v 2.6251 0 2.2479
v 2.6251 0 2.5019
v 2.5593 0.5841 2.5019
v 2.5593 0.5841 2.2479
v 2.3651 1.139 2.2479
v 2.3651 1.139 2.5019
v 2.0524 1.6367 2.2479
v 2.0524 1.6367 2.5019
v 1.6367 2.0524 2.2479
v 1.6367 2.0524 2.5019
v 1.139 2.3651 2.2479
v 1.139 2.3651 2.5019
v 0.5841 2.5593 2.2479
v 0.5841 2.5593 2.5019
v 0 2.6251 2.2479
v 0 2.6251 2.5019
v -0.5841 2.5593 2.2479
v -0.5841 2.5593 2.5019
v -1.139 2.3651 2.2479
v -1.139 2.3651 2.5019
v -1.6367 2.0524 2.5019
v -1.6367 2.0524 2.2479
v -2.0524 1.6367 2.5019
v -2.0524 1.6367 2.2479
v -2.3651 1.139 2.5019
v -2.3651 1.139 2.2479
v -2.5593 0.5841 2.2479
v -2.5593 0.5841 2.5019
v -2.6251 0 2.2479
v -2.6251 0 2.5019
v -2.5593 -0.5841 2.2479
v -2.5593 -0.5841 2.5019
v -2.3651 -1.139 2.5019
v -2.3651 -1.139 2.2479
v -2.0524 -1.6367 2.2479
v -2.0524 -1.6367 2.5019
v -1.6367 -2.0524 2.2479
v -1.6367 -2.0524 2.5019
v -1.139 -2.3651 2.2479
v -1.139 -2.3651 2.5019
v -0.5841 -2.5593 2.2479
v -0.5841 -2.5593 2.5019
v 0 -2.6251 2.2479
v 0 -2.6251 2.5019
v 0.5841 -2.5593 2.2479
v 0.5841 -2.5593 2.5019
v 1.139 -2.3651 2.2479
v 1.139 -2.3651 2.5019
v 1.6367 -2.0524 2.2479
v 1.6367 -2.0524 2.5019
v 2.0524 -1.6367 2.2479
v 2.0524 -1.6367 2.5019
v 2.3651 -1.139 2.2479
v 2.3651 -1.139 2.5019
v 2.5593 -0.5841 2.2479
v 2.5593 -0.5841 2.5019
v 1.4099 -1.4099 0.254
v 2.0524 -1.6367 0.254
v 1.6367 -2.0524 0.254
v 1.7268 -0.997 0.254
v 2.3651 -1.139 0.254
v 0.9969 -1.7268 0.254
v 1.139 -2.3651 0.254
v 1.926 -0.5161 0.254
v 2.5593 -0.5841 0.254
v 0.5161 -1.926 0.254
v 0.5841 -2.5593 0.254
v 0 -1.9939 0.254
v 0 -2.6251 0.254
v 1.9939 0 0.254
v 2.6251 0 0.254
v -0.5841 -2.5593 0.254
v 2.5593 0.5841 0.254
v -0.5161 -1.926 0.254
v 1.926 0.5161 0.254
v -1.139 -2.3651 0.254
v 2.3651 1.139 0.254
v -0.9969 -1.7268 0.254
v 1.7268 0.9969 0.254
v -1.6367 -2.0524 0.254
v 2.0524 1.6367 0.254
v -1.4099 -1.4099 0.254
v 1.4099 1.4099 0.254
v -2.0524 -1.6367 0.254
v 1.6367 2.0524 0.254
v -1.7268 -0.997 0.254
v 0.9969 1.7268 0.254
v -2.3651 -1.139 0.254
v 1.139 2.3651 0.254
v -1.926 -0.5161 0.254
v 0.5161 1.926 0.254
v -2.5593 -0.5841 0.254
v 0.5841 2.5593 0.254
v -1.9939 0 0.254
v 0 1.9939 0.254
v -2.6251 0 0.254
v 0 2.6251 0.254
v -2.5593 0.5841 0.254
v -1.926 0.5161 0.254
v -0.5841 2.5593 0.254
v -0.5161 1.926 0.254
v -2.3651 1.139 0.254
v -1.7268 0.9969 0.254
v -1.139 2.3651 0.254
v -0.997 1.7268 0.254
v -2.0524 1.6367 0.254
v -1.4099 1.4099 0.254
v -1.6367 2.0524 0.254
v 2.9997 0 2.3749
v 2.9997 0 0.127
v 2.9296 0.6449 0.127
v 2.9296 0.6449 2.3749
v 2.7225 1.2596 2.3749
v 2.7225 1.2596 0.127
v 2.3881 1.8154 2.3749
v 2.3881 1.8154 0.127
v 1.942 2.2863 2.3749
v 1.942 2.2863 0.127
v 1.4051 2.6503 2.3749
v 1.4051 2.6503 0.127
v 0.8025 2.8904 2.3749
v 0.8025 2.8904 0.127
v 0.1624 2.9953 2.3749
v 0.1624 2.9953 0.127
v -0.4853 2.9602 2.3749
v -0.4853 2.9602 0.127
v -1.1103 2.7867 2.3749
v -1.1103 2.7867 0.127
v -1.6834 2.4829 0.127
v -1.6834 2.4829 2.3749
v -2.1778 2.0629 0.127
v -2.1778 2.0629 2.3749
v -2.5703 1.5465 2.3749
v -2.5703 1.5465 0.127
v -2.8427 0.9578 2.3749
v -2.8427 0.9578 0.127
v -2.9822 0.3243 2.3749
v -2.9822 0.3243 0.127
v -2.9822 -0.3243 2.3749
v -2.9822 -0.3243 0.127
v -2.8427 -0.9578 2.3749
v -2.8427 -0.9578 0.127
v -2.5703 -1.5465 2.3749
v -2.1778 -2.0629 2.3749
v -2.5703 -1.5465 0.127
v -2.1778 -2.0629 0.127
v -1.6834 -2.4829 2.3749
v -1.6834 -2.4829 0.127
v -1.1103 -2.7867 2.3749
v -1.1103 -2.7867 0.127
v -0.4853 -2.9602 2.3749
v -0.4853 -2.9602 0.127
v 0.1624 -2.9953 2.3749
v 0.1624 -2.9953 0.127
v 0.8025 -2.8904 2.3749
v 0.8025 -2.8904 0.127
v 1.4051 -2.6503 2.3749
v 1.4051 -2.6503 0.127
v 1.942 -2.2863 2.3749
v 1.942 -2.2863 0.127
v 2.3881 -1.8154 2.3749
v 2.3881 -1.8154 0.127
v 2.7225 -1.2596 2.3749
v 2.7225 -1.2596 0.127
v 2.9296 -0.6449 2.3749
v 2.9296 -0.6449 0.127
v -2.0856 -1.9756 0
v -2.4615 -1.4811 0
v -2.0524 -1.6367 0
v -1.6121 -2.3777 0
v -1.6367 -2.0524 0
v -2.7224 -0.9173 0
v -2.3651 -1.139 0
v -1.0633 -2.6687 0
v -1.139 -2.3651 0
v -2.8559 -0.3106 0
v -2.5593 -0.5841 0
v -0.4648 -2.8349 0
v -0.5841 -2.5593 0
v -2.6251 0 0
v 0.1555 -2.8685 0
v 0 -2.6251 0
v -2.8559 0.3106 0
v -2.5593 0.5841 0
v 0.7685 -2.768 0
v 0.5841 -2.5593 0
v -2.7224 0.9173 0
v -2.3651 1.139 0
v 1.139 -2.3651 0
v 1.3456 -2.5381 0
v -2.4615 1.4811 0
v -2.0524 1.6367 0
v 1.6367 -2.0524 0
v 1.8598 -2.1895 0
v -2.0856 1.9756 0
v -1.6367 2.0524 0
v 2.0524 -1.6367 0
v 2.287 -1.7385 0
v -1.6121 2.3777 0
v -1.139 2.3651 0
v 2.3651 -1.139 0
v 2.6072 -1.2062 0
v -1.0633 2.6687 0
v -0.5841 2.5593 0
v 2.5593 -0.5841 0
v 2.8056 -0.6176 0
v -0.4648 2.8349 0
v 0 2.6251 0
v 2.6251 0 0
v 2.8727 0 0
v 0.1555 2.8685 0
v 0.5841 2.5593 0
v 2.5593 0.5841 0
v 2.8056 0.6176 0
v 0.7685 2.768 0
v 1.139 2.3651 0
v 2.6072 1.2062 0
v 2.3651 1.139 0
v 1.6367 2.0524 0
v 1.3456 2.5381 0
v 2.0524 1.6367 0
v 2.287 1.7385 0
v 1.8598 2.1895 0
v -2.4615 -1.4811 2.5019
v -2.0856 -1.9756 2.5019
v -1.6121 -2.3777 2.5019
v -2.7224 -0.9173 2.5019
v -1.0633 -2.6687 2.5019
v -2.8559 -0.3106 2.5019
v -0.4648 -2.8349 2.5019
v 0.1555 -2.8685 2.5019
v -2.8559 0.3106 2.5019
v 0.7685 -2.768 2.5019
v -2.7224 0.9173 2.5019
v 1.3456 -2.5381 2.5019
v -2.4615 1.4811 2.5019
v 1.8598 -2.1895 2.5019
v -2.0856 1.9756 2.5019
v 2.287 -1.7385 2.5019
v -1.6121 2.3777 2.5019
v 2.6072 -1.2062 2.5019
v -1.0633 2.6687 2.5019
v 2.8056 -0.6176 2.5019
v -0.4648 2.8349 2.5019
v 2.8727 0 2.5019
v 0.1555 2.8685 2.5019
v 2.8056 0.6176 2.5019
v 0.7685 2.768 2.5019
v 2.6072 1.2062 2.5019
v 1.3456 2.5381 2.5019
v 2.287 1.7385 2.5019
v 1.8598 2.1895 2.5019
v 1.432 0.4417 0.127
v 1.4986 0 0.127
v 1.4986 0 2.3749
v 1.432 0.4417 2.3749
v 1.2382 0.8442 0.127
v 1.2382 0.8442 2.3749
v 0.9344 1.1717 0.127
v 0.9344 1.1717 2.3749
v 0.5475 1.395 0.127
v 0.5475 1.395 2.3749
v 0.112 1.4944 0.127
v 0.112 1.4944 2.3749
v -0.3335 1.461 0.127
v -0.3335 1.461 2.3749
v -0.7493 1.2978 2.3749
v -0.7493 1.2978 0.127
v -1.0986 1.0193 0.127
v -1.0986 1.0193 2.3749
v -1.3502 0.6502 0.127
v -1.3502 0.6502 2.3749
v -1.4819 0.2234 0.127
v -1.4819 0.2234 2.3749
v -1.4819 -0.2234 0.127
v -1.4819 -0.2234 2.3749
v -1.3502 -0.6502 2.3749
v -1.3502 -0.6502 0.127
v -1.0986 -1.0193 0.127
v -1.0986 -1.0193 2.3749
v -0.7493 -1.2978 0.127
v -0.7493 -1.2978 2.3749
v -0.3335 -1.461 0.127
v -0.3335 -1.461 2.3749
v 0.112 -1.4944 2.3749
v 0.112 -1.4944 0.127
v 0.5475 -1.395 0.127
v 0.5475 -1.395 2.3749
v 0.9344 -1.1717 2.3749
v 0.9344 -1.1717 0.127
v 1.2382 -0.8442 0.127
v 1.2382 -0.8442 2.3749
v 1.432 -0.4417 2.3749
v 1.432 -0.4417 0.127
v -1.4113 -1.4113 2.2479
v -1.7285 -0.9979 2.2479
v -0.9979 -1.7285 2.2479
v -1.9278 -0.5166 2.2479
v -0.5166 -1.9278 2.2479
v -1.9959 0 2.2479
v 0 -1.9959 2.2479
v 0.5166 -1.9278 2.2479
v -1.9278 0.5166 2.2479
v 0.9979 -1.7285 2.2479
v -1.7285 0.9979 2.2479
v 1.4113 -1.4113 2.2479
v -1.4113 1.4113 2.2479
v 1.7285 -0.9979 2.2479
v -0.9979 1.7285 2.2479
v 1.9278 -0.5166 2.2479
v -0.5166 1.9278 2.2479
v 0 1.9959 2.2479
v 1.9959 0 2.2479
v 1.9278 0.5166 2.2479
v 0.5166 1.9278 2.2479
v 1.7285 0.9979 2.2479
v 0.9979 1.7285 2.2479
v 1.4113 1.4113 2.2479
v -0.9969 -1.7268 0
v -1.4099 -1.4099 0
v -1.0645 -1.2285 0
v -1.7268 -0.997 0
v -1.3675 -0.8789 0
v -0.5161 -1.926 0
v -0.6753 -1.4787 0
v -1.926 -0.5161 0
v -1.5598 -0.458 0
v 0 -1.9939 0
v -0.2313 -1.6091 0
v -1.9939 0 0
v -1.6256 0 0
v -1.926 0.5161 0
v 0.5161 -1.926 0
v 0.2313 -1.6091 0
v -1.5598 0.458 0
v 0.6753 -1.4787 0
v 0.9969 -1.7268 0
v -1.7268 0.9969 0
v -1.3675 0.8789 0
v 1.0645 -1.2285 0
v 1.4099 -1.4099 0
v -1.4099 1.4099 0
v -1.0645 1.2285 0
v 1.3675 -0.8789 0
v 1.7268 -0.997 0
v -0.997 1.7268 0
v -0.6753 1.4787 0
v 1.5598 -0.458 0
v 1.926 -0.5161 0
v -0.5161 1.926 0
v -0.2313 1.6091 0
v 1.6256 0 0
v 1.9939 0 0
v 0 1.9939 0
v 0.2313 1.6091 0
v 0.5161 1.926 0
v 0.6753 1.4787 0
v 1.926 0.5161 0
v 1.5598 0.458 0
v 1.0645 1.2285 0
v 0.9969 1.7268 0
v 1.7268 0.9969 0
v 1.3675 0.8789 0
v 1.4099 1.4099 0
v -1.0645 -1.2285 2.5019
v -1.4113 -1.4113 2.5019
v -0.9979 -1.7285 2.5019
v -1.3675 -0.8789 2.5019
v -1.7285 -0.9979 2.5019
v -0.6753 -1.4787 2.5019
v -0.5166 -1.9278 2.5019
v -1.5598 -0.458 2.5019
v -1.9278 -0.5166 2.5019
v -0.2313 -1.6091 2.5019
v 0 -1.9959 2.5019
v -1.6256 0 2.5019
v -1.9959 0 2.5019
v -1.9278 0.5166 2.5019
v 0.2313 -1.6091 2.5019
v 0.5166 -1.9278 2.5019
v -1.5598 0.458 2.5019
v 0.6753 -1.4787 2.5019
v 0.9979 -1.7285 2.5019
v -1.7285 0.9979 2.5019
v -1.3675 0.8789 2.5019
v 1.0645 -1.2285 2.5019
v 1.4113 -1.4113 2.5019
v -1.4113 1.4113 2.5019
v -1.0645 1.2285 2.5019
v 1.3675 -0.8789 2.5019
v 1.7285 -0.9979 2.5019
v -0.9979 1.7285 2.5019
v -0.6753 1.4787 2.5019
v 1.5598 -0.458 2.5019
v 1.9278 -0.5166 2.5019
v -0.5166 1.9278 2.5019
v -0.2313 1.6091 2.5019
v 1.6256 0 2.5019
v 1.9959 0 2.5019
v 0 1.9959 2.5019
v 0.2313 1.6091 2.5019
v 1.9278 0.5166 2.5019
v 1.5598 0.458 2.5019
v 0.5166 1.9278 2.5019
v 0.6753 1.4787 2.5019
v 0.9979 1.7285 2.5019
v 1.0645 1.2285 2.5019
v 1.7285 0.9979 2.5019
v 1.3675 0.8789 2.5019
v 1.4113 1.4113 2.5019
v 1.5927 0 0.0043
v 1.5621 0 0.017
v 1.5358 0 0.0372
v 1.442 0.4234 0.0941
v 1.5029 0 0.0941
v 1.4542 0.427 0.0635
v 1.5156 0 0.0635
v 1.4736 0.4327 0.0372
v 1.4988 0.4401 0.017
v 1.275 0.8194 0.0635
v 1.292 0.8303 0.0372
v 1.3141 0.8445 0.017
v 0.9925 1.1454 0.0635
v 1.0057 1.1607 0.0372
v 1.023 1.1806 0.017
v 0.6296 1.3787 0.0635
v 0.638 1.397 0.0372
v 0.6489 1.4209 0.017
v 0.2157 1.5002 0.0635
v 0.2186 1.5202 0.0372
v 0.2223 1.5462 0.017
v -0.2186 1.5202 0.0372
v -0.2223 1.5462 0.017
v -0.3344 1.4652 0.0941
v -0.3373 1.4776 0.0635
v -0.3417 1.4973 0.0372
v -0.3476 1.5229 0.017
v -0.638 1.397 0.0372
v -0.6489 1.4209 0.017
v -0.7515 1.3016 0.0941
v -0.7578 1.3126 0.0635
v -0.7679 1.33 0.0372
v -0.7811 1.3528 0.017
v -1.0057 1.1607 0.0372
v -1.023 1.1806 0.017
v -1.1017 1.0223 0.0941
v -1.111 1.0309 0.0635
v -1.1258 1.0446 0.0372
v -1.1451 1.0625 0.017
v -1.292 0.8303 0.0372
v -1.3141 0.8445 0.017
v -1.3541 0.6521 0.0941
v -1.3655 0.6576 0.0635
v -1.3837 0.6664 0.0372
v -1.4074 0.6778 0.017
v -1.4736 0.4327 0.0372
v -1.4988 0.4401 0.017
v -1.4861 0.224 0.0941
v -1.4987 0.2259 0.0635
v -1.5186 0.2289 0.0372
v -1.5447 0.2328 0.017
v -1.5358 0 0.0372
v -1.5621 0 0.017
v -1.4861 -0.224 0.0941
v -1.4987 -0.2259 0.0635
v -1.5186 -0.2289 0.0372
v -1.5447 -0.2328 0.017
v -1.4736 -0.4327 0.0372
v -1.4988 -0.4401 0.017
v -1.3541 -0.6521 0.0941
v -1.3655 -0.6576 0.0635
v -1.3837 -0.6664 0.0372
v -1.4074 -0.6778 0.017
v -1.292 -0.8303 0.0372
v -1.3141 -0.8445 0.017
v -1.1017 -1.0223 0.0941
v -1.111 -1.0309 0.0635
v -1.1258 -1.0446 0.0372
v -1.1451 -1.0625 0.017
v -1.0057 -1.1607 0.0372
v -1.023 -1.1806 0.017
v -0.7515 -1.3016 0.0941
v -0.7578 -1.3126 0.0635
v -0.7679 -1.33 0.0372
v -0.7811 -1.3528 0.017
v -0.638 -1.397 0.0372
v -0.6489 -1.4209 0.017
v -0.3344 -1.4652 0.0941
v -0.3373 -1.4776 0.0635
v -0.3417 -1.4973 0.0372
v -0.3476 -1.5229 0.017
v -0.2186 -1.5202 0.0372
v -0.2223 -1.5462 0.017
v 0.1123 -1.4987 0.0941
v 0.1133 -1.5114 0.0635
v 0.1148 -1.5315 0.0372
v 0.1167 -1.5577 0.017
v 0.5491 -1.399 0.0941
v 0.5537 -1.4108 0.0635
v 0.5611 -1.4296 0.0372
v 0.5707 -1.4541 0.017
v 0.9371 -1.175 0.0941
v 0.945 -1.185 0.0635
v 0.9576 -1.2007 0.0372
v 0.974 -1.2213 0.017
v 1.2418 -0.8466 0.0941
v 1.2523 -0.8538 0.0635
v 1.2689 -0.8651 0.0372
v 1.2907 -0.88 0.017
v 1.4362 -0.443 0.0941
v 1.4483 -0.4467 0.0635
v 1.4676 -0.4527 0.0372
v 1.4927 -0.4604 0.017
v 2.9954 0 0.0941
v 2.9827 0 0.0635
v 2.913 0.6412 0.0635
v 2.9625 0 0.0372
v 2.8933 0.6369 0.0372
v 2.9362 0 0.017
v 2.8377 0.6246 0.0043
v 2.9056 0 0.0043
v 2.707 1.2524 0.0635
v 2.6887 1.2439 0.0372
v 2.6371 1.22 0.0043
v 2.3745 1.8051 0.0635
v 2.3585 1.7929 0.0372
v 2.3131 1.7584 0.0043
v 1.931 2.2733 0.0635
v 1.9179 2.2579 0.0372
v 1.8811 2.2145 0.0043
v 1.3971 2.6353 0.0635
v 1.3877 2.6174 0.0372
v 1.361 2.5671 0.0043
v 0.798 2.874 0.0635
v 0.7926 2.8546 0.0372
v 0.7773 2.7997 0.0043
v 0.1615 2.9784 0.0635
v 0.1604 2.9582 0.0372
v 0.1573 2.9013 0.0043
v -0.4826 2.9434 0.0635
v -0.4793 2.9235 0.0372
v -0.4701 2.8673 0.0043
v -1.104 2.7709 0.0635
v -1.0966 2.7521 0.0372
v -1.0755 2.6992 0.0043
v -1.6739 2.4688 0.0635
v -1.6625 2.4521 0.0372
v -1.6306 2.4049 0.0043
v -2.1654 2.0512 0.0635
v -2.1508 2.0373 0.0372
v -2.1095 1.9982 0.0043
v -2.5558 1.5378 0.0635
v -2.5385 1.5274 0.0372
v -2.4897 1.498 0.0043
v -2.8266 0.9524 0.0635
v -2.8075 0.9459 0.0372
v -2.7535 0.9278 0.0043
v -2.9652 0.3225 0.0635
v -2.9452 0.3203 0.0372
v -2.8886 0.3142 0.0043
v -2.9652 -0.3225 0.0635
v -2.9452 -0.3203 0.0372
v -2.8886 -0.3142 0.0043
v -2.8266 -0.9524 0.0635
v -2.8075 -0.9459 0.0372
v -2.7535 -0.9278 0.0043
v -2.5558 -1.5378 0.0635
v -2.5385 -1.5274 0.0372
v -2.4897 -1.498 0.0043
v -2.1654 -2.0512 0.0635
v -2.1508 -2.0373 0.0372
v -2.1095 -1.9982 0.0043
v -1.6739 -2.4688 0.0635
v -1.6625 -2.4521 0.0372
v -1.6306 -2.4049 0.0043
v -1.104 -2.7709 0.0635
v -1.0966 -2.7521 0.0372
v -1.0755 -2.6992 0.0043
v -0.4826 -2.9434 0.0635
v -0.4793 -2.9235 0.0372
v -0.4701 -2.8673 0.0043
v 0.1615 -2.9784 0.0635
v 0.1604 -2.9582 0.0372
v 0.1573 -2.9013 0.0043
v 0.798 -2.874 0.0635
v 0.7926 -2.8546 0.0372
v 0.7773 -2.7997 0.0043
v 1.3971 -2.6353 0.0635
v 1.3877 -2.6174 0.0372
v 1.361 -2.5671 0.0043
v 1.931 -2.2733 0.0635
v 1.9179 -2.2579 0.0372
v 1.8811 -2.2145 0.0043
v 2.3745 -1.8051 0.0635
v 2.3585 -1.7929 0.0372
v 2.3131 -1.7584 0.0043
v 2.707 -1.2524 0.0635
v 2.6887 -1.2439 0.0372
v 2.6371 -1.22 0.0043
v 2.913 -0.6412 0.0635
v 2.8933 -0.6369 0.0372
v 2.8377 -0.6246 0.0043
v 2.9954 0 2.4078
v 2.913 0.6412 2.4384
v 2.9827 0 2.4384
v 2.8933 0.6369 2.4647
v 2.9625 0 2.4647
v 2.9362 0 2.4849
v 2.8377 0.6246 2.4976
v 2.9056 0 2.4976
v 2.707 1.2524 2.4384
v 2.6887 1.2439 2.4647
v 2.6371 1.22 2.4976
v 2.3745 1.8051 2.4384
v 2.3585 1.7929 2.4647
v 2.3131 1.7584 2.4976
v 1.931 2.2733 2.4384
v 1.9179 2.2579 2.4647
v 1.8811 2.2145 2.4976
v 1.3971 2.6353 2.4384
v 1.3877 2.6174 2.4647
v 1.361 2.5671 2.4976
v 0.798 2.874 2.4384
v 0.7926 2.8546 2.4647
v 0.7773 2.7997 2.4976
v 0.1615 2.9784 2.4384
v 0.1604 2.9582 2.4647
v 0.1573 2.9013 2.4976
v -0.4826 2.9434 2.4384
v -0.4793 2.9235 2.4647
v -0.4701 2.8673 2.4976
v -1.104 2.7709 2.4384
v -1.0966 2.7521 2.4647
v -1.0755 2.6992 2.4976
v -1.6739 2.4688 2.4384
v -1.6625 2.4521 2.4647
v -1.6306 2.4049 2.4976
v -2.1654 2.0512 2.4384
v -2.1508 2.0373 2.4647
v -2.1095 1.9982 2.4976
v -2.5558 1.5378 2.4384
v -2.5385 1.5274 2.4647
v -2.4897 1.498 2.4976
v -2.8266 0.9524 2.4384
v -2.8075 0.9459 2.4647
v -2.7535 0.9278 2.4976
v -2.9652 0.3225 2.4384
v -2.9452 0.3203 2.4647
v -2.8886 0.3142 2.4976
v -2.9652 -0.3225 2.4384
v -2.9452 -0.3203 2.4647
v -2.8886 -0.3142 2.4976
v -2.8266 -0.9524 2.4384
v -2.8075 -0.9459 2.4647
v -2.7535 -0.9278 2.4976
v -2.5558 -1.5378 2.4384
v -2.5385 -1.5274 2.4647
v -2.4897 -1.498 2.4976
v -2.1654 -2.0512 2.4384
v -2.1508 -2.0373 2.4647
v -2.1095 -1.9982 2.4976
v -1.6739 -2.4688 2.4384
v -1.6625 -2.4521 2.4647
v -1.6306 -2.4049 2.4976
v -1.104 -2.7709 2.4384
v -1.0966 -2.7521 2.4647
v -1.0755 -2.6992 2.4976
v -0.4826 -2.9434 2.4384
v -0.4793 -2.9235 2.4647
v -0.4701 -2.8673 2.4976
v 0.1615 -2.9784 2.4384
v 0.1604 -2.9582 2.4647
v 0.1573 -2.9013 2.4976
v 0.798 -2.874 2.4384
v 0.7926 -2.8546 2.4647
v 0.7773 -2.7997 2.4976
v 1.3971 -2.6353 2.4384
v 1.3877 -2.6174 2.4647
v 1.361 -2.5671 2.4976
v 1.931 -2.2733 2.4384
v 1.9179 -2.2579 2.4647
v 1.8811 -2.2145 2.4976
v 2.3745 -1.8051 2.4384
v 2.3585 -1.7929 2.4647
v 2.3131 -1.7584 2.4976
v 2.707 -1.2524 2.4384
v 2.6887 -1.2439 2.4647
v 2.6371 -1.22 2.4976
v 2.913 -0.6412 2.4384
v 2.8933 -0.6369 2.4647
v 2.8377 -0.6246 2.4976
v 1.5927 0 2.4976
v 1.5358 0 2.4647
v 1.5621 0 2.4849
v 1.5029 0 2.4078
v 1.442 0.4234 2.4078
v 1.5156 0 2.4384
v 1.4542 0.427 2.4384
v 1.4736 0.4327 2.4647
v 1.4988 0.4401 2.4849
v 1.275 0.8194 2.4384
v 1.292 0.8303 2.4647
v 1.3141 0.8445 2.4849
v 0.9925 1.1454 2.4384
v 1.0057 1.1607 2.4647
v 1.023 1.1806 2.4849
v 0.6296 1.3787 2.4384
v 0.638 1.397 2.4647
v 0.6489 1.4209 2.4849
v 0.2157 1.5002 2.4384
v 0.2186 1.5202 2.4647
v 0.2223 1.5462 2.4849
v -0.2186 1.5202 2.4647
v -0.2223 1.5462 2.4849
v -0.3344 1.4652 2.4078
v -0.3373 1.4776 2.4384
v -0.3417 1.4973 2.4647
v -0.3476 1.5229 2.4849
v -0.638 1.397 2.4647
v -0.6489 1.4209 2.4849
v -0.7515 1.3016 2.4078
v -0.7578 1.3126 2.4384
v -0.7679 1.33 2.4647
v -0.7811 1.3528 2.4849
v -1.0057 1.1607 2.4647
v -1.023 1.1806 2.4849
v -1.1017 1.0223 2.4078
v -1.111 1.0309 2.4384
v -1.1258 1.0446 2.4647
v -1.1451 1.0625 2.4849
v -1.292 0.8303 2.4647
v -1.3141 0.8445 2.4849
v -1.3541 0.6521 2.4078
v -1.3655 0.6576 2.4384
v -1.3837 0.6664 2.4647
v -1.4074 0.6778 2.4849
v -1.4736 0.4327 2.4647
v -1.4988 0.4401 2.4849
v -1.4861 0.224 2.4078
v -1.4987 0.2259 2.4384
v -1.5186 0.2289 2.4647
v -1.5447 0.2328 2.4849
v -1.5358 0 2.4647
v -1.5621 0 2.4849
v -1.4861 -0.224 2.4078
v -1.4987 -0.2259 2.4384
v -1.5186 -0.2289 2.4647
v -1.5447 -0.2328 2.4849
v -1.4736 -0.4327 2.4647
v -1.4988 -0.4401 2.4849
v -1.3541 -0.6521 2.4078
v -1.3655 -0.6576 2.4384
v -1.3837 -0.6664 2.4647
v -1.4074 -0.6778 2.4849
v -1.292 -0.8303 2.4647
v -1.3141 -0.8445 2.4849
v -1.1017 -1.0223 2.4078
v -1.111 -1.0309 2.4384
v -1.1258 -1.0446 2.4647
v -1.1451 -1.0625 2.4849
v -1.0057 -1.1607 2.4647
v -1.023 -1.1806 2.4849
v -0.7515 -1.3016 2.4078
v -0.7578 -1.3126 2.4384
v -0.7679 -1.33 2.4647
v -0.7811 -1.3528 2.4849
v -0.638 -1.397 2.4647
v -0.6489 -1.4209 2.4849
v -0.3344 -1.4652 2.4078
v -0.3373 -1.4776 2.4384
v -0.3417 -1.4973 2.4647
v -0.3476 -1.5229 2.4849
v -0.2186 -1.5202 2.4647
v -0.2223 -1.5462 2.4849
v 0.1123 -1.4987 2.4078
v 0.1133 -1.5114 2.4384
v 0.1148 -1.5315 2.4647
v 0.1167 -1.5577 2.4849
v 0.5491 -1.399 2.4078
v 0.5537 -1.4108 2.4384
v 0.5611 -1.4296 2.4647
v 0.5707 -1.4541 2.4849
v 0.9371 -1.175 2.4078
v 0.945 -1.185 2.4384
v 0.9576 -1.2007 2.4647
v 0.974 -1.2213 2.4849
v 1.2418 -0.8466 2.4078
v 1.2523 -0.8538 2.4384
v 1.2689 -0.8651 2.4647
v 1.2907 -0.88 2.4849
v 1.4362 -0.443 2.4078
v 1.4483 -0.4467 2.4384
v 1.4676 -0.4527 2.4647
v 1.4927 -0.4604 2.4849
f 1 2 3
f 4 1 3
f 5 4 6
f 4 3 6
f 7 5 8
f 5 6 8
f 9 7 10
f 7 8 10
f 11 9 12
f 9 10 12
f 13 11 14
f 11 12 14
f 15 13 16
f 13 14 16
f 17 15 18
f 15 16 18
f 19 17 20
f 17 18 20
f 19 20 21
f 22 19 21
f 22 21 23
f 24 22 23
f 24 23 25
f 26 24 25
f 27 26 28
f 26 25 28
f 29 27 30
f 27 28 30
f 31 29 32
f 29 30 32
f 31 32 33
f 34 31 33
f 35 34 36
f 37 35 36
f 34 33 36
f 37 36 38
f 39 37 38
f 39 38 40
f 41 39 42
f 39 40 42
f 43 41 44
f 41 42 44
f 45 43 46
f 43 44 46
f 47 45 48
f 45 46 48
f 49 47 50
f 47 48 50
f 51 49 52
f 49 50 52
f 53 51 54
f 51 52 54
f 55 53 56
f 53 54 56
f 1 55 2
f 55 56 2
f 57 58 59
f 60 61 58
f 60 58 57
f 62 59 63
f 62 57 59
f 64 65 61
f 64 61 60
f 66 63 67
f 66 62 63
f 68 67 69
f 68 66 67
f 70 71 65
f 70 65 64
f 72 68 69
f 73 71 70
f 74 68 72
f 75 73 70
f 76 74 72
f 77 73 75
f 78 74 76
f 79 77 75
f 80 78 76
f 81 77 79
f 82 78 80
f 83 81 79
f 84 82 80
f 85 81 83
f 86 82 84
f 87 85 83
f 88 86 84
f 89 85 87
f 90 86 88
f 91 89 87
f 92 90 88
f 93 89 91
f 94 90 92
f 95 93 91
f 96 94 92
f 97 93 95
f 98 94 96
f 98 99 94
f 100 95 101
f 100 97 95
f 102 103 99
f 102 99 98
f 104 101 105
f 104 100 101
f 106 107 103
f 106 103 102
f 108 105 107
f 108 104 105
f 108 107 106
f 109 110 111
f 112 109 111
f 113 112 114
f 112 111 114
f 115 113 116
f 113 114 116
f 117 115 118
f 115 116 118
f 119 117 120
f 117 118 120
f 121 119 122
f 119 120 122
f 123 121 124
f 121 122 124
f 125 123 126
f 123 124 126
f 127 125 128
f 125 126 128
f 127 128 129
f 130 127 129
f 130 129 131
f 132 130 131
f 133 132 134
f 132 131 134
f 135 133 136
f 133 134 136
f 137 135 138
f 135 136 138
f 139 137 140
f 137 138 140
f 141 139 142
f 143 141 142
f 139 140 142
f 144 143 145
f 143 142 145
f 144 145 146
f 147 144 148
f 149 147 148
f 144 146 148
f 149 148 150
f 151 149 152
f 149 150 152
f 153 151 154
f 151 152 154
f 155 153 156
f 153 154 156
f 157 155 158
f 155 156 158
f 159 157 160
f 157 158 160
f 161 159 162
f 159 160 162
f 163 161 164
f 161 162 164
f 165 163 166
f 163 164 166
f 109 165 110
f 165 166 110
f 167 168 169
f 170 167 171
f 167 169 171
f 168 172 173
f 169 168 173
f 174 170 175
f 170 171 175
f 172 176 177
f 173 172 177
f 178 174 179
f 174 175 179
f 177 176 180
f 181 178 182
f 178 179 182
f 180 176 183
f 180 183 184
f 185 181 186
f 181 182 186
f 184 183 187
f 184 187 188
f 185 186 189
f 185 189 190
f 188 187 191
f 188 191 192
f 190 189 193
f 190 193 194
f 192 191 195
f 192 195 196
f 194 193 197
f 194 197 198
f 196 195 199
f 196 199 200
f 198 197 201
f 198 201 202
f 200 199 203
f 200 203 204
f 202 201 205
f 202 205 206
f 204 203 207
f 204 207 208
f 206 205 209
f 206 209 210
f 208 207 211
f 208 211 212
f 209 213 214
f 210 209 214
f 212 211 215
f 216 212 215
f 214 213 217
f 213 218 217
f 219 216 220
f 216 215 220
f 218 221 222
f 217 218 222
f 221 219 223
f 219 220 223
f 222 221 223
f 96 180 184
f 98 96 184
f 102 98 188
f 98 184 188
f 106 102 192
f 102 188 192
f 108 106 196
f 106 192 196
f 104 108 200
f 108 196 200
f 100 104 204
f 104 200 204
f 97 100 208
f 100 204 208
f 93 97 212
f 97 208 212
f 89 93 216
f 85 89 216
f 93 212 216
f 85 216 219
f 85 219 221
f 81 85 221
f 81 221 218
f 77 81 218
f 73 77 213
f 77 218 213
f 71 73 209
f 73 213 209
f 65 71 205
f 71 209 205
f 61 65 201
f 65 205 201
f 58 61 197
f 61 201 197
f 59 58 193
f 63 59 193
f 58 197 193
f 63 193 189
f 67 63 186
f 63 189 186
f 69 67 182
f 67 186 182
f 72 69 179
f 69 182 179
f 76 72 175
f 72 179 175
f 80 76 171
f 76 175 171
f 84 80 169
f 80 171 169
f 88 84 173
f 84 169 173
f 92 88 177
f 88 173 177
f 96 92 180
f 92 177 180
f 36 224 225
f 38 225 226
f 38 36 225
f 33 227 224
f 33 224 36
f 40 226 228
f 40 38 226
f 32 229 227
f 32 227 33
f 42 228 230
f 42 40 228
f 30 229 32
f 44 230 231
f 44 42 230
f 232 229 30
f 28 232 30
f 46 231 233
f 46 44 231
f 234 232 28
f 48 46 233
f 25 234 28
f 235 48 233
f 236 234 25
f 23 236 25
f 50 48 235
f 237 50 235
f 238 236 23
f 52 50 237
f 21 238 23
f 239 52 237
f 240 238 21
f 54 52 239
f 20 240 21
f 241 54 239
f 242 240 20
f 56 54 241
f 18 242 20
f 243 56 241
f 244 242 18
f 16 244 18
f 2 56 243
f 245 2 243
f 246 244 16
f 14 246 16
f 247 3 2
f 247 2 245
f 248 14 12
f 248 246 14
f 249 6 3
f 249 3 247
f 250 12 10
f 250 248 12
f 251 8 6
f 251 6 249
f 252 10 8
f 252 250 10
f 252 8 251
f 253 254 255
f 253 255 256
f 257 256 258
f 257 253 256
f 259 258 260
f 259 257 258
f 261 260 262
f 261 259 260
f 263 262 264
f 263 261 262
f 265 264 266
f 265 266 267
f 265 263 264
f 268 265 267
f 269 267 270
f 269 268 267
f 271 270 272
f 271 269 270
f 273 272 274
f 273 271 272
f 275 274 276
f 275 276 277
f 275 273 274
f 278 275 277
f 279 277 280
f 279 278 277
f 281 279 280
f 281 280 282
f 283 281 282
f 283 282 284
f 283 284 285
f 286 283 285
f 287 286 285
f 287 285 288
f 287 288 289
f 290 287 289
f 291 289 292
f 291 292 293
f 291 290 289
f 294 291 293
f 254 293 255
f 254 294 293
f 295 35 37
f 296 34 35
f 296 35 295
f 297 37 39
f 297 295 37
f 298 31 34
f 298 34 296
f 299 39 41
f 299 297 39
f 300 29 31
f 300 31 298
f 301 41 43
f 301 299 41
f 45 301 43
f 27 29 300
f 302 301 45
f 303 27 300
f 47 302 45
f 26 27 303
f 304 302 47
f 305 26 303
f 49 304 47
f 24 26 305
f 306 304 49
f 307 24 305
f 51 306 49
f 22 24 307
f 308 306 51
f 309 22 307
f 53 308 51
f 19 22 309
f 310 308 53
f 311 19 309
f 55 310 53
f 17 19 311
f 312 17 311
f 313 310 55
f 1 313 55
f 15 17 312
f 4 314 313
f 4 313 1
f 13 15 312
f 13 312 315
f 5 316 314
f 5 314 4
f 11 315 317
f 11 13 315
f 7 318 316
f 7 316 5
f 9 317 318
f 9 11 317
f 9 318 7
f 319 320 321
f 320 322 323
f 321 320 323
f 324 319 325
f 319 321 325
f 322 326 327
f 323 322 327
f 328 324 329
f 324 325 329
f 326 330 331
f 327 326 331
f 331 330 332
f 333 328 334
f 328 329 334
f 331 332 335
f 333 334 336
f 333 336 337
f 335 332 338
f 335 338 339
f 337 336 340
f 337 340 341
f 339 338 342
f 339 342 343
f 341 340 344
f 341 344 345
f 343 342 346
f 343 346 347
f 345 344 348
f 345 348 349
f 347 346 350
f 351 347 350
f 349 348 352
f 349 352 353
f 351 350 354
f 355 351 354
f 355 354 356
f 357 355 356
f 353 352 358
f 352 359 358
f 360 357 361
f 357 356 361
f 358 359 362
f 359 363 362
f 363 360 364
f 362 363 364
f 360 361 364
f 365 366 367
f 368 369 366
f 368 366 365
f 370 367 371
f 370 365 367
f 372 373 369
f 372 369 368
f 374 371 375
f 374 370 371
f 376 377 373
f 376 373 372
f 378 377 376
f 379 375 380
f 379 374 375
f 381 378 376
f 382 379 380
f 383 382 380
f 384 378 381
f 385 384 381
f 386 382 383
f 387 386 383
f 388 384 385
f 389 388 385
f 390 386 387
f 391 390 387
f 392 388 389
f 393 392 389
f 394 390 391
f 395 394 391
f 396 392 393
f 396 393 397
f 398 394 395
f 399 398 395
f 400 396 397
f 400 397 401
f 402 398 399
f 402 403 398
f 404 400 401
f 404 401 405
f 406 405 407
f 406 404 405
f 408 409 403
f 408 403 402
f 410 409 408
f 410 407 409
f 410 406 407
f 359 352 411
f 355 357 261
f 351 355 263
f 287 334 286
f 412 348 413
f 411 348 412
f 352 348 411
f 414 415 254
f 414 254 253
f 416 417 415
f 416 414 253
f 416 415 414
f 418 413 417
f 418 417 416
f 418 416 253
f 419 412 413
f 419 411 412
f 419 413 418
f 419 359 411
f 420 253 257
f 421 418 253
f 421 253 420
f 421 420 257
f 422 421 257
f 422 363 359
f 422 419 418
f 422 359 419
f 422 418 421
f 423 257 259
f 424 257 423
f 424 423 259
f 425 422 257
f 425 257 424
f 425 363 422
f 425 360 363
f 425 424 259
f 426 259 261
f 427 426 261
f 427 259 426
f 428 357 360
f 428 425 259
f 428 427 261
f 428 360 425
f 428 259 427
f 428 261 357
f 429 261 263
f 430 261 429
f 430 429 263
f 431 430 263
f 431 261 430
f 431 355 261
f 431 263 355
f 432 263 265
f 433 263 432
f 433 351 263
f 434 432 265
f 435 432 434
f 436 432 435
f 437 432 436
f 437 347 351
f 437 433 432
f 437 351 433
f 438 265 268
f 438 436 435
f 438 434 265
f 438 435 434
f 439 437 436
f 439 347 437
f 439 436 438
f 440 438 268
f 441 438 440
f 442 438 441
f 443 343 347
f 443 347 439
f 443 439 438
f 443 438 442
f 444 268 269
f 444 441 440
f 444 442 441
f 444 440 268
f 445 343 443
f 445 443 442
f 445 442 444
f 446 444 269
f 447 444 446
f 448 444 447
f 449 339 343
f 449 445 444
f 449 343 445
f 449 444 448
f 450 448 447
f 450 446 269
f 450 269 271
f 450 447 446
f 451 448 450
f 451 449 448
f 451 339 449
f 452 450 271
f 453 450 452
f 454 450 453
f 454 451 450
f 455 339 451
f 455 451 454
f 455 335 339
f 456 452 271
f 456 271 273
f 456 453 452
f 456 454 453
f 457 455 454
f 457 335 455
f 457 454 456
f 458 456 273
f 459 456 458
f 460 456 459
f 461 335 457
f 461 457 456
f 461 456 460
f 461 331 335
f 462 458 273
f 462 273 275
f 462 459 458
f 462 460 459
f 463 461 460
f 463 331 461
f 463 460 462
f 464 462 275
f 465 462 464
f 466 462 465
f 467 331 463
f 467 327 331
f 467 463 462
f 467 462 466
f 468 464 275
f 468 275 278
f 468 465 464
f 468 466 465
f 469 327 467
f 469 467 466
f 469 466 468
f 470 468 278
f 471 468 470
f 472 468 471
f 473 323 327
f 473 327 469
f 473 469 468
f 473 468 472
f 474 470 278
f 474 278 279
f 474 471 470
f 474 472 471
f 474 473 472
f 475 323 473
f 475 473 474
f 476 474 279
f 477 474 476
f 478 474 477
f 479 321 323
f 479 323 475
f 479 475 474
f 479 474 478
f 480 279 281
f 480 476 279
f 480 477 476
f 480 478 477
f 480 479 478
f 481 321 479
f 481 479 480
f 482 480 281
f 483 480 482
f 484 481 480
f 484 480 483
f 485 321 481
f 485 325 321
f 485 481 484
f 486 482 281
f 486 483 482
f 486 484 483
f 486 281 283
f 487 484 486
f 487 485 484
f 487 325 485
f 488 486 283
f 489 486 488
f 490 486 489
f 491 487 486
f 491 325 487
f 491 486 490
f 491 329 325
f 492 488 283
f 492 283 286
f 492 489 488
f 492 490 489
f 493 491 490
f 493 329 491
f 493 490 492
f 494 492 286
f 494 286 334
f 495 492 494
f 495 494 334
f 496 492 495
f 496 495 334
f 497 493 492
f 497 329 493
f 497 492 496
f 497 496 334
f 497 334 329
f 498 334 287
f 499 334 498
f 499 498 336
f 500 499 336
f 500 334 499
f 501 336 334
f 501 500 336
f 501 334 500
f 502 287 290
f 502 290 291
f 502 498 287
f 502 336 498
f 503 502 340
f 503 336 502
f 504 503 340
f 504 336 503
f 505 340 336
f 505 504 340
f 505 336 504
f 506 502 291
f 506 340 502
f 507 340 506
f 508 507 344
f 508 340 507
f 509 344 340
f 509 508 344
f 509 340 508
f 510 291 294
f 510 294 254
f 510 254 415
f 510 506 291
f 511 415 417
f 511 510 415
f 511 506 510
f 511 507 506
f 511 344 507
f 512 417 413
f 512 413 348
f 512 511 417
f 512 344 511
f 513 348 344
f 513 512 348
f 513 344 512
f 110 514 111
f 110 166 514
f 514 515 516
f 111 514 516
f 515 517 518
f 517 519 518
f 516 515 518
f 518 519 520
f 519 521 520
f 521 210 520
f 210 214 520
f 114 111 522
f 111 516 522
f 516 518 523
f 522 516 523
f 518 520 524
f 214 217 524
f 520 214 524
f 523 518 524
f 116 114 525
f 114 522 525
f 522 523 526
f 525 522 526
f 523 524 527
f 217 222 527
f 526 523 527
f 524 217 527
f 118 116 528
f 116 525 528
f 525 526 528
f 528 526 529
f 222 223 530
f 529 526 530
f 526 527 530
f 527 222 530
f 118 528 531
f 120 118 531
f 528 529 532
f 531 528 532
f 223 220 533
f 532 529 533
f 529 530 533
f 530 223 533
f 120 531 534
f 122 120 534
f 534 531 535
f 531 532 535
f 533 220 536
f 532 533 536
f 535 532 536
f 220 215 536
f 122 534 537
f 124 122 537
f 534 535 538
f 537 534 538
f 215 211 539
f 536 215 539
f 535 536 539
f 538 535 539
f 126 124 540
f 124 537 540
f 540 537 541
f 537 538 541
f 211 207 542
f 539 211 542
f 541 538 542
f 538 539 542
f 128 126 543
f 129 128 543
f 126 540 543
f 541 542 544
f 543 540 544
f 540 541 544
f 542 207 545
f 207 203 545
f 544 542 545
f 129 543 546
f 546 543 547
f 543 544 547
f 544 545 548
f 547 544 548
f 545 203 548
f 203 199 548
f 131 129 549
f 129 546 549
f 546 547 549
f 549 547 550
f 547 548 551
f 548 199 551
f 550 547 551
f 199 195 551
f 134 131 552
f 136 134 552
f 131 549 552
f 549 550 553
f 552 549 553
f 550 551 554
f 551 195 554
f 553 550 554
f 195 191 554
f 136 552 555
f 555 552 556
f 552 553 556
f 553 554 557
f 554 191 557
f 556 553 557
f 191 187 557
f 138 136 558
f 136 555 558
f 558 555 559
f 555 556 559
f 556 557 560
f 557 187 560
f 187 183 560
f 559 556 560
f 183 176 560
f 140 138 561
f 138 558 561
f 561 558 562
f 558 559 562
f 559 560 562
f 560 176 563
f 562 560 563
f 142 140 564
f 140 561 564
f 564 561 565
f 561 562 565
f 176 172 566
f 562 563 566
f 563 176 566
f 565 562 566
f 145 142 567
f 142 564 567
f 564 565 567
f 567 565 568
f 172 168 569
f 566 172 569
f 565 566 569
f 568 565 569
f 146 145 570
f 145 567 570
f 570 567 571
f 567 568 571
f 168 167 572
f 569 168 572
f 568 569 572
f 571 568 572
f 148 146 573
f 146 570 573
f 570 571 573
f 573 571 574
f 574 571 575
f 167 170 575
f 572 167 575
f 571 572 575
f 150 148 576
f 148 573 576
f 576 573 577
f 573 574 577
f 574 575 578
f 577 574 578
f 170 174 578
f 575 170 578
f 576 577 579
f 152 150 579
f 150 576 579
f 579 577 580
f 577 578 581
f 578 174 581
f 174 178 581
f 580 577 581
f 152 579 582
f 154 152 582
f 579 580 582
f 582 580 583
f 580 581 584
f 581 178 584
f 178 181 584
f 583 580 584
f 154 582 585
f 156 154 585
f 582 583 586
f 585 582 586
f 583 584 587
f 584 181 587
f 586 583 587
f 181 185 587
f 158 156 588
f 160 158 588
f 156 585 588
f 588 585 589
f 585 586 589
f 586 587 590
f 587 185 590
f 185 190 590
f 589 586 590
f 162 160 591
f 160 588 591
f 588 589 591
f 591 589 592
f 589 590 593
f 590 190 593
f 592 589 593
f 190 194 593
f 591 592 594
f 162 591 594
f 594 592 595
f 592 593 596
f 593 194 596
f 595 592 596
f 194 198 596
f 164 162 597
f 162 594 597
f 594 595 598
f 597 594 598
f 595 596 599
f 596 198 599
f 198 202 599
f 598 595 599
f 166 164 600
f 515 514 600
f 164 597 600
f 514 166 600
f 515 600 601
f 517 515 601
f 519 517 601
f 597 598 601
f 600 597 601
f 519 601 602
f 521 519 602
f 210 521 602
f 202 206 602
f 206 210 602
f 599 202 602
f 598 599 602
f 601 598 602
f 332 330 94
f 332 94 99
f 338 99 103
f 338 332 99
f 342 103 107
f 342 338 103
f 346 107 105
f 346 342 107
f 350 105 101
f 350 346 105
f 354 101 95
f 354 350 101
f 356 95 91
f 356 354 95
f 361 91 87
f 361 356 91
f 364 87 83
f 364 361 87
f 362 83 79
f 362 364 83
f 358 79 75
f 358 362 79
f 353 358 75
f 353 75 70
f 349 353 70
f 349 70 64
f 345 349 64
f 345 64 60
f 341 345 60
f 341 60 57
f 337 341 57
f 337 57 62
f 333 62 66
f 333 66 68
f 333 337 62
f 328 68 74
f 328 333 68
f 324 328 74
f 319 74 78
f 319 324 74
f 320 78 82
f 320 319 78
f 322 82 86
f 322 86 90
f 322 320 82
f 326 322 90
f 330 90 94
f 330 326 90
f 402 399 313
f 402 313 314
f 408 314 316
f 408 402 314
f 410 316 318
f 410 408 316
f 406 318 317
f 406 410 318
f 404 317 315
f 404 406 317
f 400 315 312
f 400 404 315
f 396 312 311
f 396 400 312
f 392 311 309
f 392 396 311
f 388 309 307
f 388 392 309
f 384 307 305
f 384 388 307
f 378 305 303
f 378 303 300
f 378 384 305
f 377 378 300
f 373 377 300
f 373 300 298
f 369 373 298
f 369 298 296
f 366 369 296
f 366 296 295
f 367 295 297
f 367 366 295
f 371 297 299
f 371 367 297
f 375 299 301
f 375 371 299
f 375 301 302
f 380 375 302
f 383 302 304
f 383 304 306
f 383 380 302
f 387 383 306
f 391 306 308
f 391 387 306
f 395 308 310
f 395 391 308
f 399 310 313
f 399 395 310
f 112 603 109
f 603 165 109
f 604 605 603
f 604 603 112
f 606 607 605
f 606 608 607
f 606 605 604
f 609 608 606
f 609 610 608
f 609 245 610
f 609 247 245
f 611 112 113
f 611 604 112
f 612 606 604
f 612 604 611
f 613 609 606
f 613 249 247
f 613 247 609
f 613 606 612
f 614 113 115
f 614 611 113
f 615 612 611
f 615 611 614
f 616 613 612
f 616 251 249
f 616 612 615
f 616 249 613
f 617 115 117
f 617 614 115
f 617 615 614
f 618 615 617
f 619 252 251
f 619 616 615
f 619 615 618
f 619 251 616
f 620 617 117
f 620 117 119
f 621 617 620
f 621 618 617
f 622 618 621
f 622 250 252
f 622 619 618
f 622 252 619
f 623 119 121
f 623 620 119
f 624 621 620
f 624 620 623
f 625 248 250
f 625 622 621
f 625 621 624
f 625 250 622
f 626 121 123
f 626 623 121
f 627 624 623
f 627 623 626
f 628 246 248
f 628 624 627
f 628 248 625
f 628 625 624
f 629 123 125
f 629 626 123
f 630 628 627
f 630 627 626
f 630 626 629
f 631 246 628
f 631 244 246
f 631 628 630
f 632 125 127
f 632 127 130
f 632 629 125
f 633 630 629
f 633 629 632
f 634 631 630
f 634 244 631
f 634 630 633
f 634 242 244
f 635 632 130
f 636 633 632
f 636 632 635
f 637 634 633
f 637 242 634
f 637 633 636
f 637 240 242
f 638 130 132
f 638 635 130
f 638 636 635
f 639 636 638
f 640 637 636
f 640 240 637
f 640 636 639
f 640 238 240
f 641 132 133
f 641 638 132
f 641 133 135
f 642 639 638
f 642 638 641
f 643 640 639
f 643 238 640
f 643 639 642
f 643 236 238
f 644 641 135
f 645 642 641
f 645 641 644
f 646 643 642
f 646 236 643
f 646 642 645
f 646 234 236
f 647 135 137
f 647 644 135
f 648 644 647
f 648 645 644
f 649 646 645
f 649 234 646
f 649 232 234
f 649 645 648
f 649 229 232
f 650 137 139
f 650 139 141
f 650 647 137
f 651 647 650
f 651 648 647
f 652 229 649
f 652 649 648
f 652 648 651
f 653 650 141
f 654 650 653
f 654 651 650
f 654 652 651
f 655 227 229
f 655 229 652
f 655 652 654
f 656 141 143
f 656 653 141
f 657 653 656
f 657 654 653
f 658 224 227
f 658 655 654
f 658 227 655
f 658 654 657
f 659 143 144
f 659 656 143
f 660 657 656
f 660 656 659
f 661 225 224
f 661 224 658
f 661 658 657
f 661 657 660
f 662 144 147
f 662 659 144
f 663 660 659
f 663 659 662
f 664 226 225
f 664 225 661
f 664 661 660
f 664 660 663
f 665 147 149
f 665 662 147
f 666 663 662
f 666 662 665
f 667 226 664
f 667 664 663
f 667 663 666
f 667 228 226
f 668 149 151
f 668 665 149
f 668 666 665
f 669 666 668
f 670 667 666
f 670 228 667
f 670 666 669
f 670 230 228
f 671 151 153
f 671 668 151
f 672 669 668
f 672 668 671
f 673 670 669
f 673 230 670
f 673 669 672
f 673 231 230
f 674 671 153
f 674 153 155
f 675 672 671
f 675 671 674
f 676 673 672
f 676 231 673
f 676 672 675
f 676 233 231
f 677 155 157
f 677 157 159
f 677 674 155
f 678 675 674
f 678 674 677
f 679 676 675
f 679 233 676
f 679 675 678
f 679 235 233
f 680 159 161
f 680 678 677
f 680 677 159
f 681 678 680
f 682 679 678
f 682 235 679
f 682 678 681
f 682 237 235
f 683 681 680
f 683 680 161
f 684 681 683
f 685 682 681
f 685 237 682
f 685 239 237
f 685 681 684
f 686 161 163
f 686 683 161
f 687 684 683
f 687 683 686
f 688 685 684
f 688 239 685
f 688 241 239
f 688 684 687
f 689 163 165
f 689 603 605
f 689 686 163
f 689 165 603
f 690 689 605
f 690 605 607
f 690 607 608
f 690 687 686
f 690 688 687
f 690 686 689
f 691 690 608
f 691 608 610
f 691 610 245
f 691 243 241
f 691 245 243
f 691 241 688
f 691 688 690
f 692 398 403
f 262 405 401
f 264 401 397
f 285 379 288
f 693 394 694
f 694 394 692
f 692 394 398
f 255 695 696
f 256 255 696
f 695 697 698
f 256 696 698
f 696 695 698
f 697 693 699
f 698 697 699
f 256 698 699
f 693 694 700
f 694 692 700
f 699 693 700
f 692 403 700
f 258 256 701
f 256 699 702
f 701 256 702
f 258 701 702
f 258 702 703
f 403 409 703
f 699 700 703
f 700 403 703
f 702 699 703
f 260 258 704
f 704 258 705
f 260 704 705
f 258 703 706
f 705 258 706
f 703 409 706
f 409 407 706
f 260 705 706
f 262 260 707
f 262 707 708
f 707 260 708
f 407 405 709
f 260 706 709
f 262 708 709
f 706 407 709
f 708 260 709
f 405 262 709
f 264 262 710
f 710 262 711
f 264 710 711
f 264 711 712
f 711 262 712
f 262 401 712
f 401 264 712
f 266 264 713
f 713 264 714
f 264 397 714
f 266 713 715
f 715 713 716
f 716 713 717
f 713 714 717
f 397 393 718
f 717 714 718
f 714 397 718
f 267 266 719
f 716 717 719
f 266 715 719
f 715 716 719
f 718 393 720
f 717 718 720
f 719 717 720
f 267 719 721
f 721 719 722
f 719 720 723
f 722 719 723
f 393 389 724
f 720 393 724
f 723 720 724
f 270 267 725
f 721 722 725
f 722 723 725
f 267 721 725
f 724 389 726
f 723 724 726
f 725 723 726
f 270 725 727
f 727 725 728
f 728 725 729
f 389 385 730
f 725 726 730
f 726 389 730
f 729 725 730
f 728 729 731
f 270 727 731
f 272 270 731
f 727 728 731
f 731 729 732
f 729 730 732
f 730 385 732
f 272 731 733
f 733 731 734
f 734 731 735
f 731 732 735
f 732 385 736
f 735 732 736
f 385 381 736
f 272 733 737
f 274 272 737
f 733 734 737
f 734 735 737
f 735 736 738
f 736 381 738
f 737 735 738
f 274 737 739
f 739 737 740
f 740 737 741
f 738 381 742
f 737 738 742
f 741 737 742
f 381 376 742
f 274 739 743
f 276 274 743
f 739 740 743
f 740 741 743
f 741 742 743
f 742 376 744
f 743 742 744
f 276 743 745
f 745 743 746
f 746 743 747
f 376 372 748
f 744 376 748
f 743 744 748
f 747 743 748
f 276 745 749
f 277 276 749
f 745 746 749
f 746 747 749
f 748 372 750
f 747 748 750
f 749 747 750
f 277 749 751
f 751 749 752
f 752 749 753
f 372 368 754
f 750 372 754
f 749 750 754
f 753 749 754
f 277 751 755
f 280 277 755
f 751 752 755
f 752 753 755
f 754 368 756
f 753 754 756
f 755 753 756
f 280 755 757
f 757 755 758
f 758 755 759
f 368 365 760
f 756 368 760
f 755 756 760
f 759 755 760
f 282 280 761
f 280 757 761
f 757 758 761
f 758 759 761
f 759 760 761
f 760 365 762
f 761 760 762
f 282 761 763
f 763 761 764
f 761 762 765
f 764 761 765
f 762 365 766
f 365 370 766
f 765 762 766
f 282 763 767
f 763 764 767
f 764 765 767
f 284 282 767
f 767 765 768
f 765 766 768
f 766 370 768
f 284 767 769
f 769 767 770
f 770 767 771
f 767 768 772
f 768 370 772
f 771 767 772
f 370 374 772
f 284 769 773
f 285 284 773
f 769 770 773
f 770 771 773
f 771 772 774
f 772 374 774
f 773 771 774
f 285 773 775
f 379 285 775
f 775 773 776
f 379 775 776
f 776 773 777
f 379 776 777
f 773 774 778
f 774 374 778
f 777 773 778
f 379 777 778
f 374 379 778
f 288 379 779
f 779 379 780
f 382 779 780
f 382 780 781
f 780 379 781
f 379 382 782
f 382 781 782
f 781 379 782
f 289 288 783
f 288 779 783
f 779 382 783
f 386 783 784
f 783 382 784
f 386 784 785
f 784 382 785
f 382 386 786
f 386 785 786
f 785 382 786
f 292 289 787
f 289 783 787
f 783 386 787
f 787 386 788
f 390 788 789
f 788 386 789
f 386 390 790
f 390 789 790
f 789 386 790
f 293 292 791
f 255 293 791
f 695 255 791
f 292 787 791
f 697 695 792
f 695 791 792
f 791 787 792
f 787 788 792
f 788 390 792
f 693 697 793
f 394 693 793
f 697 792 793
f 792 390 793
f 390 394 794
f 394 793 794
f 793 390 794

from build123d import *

# Parameters (mm, degrees)
SKETCH1_R          = 2.99974
SKETCH1_R_2        = 1.4986
EXTRUDE1_DEPTH     = 2.5019
FILLET1_R          = 0.127
SKETCH2_R          = 2.625078694
SKETCH2_R_2        = 1.99585199
CUT_EXTRUDE1_DEPTH = 0.254
SKETCH3_R          = 2.62509
SKETCH3_R_2        = 1.9939
CUT_EXTRUDE2_DEPTH = 0.254


with BuildPart() as part:
    # Sketch1 → Extrude1 (new body)
    with BuildSketch(Plane.XY):
        Circle(SKETCH1_R)
        Circle(SKETCH1_R_2, mode=Mode.SUBTRACT)
    extrude(amount=EXTRUDE1_DEPTH)

    # Fillet1
    fillet1_edges = [part.edges().sort_by_distance(p)[0] for p in [
        (-2.99974, 0, 0),
        (-2.99974, 0, 2.5019),
        (-1.4986, 0, 0),
        (-1.4986, 0, 2.5019),
    ]]
    fillet(fillet1_edges, radius=FILLET1_R)

    # Sketch2 → Cut-Extrude1 (cut)
    with BuildSketch(Plane.XY.offset(2.5019)):
        Circle(SKETCH2_R)
        Circle(SKETCH2_R_2, mode=Mode.SUBTRACT)
    extrude(amount=-CUT_EXTRUDE1_DEPTH, mode=Mode.SUBTRACT)

    # Sketch3 → Cut-Extrude2 (cut)
    with BuildSketch(Plane(origin=(0, 0, 0), x_dir=(-1, 0, 0), z_dir=(0, 0, -1))):
        Circle(SKETCH3_R)
        Circle(SKETCH3_R_2, mode=Mode.SUBTRACT)
    extrude(amount=-CUT_EXTRUDE2_DEPTH, mode=Mode.SUBTRACT)


solid = part.part
